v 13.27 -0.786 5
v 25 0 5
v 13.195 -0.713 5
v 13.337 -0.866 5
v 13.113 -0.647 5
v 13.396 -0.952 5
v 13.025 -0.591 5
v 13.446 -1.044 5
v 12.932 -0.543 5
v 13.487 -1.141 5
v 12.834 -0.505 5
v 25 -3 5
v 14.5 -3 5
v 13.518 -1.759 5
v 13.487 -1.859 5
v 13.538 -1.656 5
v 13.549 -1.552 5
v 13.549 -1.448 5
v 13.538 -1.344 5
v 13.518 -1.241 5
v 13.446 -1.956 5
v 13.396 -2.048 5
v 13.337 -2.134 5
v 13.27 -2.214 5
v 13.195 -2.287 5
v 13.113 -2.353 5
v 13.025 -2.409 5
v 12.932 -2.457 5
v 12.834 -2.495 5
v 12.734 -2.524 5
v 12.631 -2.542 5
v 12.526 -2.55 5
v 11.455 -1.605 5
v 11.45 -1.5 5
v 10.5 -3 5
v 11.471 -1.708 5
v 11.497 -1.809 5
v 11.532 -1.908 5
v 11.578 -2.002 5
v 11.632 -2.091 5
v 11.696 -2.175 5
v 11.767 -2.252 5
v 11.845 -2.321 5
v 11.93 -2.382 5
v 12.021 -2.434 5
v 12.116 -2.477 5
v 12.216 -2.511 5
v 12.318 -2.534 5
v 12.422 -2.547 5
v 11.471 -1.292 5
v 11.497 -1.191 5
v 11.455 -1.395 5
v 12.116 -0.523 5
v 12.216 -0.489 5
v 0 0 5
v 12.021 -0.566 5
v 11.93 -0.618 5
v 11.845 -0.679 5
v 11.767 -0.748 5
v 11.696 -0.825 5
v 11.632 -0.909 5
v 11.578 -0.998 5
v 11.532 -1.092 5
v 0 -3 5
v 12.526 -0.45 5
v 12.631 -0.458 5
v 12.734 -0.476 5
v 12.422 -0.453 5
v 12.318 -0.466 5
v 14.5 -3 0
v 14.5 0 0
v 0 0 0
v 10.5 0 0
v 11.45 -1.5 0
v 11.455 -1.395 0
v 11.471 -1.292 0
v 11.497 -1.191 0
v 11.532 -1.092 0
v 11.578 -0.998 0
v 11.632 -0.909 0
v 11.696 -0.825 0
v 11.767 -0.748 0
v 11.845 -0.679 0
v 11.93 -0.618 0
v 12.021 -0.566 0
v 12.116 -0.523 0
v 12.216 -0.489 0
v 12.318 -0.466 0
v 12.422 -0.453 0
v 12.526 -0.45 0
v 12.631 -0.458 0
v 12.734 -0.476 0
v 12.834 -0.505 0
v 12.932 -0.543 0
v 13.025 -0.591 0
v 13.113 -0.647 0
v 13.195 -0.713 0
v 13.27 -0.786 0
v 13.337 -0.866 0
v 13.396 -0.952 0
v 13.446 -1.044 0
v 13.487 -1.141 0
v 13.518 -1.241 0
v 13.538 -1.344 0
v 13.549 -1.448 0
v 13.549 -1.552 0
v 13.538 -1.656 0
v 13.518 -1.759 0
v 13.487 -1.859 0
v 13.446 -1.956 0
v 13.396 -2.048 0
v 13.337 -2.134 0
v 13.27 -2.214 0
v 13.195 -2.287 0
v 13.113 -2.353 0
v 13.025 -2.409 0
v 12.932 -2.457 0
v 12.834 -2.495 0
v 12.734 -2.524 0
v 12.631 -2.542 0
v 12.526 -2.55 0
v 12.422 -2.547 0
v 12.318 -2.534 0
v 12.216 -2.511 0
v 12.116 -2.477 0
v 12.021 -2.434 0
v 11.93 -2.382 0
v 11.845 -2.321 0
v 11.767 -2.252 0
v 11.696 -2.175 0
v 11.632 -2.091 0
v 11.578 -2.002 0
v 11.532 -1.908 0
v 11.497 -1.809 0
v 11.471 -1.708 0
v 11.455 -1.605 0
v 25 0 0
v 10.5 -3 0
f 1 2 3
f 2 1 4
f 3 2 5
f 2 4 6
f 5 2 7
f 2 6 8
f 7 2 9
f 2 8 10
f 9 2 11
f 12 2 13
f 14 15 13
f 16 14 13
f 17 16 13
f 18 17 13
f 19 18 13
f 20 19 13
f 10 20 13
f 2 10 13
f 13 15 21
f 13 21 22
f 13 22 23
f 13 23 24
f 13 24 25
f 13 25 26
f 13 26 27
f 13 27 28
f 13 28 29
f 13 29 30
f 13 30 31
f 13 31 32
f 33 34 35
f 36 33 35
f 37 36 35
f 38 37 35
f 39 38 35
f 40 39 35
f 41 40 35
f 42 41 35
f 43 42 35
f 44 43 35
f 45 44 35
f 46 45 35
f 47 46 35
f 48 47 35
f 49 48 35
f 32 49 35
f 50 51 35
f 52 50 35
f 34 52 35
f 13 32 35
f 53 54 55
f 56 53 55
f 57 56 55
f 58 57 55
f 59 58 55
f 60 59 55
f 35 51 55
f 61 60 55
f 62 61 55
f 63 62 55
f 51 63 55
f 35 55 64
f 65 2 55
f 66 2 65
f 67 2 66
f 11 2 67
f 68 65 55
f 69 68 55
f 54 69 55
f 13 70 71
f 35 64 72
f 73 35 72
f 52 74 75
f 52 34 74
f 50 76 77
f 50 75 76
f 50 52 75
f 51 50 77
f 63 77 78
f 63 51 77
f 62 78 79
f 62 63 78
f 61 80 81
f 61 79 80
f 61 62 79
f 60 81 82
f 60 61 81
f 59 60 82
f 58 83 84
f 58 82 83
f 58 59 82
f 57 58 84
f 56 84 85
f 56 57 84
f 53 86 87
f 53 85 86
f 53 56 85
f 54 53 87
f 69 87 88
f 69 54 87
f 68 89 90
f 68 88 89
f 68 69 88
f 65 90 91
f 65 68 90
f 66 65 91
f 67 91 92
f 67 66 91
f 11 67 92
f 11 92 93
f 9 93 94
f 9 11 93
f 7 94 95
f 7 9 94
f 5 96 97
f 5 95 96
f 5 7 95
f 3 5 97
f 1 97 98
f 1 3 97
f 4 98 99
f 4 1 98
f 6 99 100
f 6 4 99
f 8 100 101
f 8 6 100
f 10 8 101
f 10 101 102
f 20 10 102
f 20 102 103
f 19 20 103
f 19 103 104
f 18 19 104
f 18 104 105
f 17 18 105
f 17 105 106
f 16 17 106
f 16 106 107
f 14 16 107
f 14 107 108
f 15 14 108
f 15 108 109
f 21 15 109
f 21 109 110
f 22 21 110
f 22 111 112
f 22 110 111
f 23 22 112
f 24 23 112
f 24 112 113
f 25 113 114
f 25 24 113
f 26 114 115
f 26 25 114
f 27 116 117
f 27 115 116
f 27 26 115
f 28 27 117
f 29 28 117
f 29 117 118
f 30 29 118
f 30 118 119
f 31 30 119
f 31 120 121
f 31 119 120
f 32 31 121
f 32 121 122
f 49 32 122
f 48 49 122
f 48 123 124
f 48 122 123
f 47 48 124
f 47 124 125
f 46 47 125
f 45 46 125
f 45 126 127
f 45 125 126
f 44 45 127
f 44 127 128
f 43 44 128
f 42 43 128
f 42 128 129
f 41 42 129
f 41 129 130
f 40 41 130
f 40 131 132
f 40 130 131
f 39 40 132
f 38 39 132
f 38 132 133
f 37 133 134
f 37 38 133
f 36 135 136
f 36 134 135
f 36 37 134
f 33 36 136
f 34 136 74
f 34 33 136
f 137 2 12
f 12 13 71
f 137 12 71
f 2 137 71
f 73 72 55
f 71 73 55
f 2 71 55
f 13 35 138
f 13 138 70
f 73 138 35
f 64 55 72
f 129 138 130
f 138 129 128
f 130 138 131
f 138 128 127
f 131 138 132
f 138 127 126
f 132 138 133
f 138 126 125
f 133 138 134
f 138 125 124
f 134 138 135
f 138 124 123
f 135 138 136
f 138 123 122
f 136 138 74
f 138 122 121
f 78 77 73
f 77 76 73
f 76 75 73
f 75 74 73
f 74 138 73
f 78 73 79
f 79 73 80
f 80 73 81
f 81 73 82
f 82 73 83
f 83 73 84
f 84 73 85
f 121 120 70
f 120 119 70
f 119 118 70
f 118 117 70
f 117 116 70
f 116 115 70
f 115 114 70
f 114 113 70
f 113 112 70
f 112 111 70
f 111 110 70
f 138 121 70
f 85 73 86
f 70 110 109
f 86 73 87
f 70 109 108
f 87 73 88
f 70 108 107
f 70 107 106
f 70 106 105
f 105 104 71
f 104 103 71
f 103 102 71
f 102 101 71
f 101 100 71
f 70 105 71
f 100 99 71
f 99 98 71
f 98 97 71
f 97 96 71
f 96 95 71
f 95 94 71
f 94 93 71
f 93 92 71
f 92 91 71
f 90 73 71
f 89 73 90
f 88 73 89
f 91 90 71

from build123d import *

# Parameters (mm, degrees)
BOSS_EXTRUDE1_DEPTH     = 25
SKETCH2_W               = 4
SKETCH2_H               = 3
BOSS_EXTRUDE2_DEPTH     = 5
CUT_EXTRUDE1_DEPTH      = 26.670995306
CUT_EXTRUDE1_DEPTH_BACK = 26.670995306
SKETCH3_R               = 1.05


with BuildPart() as part:
    # Sketch1 → Boss-Extrude1 (new body)
    with BuildSketch(Plane(origin=(0, 0, 0), x_dir=(0, 0, -1), z_dir=(1, 0, 0))):
        Polygon((0, 0), (-5, 0), (-5, -3), align=None)
    extrude(amount=BOSS_EXTRUDE1_DEPTH)

    # Sketch2 → Boss-Extrude2 (add)
    with BuildSketch(Plane.XY.offset(5)):
        with Locations((12.5, -1.5)):
            Rectangle(SKETCH2_W, SKETCH2_H)
    extrude(amount=-BOSS_EXTRUDE2_DEPTH)

    # Sketch3 → Cut-Extrude1 (cut, two sides: drawn at the far end of the back side and taken through both)
    with BuildSketch(Plane(origin=(0, 0, 0), x_dir=(-1, 0, 0), z_dir=(0, 0, -1)).offset(-CUT_EXTRUDE1_DEPTH_BACK)):
        with Locations((-12.5, -1.5)):
            Circle(SKETCH3_R)
    extrude(amount=CUT_EXTRUDE1_DEPTH + CUT_EXTRUDE1_DEPTH_BACK, mode=Mode.SUBTRACT)


solid = part.part
